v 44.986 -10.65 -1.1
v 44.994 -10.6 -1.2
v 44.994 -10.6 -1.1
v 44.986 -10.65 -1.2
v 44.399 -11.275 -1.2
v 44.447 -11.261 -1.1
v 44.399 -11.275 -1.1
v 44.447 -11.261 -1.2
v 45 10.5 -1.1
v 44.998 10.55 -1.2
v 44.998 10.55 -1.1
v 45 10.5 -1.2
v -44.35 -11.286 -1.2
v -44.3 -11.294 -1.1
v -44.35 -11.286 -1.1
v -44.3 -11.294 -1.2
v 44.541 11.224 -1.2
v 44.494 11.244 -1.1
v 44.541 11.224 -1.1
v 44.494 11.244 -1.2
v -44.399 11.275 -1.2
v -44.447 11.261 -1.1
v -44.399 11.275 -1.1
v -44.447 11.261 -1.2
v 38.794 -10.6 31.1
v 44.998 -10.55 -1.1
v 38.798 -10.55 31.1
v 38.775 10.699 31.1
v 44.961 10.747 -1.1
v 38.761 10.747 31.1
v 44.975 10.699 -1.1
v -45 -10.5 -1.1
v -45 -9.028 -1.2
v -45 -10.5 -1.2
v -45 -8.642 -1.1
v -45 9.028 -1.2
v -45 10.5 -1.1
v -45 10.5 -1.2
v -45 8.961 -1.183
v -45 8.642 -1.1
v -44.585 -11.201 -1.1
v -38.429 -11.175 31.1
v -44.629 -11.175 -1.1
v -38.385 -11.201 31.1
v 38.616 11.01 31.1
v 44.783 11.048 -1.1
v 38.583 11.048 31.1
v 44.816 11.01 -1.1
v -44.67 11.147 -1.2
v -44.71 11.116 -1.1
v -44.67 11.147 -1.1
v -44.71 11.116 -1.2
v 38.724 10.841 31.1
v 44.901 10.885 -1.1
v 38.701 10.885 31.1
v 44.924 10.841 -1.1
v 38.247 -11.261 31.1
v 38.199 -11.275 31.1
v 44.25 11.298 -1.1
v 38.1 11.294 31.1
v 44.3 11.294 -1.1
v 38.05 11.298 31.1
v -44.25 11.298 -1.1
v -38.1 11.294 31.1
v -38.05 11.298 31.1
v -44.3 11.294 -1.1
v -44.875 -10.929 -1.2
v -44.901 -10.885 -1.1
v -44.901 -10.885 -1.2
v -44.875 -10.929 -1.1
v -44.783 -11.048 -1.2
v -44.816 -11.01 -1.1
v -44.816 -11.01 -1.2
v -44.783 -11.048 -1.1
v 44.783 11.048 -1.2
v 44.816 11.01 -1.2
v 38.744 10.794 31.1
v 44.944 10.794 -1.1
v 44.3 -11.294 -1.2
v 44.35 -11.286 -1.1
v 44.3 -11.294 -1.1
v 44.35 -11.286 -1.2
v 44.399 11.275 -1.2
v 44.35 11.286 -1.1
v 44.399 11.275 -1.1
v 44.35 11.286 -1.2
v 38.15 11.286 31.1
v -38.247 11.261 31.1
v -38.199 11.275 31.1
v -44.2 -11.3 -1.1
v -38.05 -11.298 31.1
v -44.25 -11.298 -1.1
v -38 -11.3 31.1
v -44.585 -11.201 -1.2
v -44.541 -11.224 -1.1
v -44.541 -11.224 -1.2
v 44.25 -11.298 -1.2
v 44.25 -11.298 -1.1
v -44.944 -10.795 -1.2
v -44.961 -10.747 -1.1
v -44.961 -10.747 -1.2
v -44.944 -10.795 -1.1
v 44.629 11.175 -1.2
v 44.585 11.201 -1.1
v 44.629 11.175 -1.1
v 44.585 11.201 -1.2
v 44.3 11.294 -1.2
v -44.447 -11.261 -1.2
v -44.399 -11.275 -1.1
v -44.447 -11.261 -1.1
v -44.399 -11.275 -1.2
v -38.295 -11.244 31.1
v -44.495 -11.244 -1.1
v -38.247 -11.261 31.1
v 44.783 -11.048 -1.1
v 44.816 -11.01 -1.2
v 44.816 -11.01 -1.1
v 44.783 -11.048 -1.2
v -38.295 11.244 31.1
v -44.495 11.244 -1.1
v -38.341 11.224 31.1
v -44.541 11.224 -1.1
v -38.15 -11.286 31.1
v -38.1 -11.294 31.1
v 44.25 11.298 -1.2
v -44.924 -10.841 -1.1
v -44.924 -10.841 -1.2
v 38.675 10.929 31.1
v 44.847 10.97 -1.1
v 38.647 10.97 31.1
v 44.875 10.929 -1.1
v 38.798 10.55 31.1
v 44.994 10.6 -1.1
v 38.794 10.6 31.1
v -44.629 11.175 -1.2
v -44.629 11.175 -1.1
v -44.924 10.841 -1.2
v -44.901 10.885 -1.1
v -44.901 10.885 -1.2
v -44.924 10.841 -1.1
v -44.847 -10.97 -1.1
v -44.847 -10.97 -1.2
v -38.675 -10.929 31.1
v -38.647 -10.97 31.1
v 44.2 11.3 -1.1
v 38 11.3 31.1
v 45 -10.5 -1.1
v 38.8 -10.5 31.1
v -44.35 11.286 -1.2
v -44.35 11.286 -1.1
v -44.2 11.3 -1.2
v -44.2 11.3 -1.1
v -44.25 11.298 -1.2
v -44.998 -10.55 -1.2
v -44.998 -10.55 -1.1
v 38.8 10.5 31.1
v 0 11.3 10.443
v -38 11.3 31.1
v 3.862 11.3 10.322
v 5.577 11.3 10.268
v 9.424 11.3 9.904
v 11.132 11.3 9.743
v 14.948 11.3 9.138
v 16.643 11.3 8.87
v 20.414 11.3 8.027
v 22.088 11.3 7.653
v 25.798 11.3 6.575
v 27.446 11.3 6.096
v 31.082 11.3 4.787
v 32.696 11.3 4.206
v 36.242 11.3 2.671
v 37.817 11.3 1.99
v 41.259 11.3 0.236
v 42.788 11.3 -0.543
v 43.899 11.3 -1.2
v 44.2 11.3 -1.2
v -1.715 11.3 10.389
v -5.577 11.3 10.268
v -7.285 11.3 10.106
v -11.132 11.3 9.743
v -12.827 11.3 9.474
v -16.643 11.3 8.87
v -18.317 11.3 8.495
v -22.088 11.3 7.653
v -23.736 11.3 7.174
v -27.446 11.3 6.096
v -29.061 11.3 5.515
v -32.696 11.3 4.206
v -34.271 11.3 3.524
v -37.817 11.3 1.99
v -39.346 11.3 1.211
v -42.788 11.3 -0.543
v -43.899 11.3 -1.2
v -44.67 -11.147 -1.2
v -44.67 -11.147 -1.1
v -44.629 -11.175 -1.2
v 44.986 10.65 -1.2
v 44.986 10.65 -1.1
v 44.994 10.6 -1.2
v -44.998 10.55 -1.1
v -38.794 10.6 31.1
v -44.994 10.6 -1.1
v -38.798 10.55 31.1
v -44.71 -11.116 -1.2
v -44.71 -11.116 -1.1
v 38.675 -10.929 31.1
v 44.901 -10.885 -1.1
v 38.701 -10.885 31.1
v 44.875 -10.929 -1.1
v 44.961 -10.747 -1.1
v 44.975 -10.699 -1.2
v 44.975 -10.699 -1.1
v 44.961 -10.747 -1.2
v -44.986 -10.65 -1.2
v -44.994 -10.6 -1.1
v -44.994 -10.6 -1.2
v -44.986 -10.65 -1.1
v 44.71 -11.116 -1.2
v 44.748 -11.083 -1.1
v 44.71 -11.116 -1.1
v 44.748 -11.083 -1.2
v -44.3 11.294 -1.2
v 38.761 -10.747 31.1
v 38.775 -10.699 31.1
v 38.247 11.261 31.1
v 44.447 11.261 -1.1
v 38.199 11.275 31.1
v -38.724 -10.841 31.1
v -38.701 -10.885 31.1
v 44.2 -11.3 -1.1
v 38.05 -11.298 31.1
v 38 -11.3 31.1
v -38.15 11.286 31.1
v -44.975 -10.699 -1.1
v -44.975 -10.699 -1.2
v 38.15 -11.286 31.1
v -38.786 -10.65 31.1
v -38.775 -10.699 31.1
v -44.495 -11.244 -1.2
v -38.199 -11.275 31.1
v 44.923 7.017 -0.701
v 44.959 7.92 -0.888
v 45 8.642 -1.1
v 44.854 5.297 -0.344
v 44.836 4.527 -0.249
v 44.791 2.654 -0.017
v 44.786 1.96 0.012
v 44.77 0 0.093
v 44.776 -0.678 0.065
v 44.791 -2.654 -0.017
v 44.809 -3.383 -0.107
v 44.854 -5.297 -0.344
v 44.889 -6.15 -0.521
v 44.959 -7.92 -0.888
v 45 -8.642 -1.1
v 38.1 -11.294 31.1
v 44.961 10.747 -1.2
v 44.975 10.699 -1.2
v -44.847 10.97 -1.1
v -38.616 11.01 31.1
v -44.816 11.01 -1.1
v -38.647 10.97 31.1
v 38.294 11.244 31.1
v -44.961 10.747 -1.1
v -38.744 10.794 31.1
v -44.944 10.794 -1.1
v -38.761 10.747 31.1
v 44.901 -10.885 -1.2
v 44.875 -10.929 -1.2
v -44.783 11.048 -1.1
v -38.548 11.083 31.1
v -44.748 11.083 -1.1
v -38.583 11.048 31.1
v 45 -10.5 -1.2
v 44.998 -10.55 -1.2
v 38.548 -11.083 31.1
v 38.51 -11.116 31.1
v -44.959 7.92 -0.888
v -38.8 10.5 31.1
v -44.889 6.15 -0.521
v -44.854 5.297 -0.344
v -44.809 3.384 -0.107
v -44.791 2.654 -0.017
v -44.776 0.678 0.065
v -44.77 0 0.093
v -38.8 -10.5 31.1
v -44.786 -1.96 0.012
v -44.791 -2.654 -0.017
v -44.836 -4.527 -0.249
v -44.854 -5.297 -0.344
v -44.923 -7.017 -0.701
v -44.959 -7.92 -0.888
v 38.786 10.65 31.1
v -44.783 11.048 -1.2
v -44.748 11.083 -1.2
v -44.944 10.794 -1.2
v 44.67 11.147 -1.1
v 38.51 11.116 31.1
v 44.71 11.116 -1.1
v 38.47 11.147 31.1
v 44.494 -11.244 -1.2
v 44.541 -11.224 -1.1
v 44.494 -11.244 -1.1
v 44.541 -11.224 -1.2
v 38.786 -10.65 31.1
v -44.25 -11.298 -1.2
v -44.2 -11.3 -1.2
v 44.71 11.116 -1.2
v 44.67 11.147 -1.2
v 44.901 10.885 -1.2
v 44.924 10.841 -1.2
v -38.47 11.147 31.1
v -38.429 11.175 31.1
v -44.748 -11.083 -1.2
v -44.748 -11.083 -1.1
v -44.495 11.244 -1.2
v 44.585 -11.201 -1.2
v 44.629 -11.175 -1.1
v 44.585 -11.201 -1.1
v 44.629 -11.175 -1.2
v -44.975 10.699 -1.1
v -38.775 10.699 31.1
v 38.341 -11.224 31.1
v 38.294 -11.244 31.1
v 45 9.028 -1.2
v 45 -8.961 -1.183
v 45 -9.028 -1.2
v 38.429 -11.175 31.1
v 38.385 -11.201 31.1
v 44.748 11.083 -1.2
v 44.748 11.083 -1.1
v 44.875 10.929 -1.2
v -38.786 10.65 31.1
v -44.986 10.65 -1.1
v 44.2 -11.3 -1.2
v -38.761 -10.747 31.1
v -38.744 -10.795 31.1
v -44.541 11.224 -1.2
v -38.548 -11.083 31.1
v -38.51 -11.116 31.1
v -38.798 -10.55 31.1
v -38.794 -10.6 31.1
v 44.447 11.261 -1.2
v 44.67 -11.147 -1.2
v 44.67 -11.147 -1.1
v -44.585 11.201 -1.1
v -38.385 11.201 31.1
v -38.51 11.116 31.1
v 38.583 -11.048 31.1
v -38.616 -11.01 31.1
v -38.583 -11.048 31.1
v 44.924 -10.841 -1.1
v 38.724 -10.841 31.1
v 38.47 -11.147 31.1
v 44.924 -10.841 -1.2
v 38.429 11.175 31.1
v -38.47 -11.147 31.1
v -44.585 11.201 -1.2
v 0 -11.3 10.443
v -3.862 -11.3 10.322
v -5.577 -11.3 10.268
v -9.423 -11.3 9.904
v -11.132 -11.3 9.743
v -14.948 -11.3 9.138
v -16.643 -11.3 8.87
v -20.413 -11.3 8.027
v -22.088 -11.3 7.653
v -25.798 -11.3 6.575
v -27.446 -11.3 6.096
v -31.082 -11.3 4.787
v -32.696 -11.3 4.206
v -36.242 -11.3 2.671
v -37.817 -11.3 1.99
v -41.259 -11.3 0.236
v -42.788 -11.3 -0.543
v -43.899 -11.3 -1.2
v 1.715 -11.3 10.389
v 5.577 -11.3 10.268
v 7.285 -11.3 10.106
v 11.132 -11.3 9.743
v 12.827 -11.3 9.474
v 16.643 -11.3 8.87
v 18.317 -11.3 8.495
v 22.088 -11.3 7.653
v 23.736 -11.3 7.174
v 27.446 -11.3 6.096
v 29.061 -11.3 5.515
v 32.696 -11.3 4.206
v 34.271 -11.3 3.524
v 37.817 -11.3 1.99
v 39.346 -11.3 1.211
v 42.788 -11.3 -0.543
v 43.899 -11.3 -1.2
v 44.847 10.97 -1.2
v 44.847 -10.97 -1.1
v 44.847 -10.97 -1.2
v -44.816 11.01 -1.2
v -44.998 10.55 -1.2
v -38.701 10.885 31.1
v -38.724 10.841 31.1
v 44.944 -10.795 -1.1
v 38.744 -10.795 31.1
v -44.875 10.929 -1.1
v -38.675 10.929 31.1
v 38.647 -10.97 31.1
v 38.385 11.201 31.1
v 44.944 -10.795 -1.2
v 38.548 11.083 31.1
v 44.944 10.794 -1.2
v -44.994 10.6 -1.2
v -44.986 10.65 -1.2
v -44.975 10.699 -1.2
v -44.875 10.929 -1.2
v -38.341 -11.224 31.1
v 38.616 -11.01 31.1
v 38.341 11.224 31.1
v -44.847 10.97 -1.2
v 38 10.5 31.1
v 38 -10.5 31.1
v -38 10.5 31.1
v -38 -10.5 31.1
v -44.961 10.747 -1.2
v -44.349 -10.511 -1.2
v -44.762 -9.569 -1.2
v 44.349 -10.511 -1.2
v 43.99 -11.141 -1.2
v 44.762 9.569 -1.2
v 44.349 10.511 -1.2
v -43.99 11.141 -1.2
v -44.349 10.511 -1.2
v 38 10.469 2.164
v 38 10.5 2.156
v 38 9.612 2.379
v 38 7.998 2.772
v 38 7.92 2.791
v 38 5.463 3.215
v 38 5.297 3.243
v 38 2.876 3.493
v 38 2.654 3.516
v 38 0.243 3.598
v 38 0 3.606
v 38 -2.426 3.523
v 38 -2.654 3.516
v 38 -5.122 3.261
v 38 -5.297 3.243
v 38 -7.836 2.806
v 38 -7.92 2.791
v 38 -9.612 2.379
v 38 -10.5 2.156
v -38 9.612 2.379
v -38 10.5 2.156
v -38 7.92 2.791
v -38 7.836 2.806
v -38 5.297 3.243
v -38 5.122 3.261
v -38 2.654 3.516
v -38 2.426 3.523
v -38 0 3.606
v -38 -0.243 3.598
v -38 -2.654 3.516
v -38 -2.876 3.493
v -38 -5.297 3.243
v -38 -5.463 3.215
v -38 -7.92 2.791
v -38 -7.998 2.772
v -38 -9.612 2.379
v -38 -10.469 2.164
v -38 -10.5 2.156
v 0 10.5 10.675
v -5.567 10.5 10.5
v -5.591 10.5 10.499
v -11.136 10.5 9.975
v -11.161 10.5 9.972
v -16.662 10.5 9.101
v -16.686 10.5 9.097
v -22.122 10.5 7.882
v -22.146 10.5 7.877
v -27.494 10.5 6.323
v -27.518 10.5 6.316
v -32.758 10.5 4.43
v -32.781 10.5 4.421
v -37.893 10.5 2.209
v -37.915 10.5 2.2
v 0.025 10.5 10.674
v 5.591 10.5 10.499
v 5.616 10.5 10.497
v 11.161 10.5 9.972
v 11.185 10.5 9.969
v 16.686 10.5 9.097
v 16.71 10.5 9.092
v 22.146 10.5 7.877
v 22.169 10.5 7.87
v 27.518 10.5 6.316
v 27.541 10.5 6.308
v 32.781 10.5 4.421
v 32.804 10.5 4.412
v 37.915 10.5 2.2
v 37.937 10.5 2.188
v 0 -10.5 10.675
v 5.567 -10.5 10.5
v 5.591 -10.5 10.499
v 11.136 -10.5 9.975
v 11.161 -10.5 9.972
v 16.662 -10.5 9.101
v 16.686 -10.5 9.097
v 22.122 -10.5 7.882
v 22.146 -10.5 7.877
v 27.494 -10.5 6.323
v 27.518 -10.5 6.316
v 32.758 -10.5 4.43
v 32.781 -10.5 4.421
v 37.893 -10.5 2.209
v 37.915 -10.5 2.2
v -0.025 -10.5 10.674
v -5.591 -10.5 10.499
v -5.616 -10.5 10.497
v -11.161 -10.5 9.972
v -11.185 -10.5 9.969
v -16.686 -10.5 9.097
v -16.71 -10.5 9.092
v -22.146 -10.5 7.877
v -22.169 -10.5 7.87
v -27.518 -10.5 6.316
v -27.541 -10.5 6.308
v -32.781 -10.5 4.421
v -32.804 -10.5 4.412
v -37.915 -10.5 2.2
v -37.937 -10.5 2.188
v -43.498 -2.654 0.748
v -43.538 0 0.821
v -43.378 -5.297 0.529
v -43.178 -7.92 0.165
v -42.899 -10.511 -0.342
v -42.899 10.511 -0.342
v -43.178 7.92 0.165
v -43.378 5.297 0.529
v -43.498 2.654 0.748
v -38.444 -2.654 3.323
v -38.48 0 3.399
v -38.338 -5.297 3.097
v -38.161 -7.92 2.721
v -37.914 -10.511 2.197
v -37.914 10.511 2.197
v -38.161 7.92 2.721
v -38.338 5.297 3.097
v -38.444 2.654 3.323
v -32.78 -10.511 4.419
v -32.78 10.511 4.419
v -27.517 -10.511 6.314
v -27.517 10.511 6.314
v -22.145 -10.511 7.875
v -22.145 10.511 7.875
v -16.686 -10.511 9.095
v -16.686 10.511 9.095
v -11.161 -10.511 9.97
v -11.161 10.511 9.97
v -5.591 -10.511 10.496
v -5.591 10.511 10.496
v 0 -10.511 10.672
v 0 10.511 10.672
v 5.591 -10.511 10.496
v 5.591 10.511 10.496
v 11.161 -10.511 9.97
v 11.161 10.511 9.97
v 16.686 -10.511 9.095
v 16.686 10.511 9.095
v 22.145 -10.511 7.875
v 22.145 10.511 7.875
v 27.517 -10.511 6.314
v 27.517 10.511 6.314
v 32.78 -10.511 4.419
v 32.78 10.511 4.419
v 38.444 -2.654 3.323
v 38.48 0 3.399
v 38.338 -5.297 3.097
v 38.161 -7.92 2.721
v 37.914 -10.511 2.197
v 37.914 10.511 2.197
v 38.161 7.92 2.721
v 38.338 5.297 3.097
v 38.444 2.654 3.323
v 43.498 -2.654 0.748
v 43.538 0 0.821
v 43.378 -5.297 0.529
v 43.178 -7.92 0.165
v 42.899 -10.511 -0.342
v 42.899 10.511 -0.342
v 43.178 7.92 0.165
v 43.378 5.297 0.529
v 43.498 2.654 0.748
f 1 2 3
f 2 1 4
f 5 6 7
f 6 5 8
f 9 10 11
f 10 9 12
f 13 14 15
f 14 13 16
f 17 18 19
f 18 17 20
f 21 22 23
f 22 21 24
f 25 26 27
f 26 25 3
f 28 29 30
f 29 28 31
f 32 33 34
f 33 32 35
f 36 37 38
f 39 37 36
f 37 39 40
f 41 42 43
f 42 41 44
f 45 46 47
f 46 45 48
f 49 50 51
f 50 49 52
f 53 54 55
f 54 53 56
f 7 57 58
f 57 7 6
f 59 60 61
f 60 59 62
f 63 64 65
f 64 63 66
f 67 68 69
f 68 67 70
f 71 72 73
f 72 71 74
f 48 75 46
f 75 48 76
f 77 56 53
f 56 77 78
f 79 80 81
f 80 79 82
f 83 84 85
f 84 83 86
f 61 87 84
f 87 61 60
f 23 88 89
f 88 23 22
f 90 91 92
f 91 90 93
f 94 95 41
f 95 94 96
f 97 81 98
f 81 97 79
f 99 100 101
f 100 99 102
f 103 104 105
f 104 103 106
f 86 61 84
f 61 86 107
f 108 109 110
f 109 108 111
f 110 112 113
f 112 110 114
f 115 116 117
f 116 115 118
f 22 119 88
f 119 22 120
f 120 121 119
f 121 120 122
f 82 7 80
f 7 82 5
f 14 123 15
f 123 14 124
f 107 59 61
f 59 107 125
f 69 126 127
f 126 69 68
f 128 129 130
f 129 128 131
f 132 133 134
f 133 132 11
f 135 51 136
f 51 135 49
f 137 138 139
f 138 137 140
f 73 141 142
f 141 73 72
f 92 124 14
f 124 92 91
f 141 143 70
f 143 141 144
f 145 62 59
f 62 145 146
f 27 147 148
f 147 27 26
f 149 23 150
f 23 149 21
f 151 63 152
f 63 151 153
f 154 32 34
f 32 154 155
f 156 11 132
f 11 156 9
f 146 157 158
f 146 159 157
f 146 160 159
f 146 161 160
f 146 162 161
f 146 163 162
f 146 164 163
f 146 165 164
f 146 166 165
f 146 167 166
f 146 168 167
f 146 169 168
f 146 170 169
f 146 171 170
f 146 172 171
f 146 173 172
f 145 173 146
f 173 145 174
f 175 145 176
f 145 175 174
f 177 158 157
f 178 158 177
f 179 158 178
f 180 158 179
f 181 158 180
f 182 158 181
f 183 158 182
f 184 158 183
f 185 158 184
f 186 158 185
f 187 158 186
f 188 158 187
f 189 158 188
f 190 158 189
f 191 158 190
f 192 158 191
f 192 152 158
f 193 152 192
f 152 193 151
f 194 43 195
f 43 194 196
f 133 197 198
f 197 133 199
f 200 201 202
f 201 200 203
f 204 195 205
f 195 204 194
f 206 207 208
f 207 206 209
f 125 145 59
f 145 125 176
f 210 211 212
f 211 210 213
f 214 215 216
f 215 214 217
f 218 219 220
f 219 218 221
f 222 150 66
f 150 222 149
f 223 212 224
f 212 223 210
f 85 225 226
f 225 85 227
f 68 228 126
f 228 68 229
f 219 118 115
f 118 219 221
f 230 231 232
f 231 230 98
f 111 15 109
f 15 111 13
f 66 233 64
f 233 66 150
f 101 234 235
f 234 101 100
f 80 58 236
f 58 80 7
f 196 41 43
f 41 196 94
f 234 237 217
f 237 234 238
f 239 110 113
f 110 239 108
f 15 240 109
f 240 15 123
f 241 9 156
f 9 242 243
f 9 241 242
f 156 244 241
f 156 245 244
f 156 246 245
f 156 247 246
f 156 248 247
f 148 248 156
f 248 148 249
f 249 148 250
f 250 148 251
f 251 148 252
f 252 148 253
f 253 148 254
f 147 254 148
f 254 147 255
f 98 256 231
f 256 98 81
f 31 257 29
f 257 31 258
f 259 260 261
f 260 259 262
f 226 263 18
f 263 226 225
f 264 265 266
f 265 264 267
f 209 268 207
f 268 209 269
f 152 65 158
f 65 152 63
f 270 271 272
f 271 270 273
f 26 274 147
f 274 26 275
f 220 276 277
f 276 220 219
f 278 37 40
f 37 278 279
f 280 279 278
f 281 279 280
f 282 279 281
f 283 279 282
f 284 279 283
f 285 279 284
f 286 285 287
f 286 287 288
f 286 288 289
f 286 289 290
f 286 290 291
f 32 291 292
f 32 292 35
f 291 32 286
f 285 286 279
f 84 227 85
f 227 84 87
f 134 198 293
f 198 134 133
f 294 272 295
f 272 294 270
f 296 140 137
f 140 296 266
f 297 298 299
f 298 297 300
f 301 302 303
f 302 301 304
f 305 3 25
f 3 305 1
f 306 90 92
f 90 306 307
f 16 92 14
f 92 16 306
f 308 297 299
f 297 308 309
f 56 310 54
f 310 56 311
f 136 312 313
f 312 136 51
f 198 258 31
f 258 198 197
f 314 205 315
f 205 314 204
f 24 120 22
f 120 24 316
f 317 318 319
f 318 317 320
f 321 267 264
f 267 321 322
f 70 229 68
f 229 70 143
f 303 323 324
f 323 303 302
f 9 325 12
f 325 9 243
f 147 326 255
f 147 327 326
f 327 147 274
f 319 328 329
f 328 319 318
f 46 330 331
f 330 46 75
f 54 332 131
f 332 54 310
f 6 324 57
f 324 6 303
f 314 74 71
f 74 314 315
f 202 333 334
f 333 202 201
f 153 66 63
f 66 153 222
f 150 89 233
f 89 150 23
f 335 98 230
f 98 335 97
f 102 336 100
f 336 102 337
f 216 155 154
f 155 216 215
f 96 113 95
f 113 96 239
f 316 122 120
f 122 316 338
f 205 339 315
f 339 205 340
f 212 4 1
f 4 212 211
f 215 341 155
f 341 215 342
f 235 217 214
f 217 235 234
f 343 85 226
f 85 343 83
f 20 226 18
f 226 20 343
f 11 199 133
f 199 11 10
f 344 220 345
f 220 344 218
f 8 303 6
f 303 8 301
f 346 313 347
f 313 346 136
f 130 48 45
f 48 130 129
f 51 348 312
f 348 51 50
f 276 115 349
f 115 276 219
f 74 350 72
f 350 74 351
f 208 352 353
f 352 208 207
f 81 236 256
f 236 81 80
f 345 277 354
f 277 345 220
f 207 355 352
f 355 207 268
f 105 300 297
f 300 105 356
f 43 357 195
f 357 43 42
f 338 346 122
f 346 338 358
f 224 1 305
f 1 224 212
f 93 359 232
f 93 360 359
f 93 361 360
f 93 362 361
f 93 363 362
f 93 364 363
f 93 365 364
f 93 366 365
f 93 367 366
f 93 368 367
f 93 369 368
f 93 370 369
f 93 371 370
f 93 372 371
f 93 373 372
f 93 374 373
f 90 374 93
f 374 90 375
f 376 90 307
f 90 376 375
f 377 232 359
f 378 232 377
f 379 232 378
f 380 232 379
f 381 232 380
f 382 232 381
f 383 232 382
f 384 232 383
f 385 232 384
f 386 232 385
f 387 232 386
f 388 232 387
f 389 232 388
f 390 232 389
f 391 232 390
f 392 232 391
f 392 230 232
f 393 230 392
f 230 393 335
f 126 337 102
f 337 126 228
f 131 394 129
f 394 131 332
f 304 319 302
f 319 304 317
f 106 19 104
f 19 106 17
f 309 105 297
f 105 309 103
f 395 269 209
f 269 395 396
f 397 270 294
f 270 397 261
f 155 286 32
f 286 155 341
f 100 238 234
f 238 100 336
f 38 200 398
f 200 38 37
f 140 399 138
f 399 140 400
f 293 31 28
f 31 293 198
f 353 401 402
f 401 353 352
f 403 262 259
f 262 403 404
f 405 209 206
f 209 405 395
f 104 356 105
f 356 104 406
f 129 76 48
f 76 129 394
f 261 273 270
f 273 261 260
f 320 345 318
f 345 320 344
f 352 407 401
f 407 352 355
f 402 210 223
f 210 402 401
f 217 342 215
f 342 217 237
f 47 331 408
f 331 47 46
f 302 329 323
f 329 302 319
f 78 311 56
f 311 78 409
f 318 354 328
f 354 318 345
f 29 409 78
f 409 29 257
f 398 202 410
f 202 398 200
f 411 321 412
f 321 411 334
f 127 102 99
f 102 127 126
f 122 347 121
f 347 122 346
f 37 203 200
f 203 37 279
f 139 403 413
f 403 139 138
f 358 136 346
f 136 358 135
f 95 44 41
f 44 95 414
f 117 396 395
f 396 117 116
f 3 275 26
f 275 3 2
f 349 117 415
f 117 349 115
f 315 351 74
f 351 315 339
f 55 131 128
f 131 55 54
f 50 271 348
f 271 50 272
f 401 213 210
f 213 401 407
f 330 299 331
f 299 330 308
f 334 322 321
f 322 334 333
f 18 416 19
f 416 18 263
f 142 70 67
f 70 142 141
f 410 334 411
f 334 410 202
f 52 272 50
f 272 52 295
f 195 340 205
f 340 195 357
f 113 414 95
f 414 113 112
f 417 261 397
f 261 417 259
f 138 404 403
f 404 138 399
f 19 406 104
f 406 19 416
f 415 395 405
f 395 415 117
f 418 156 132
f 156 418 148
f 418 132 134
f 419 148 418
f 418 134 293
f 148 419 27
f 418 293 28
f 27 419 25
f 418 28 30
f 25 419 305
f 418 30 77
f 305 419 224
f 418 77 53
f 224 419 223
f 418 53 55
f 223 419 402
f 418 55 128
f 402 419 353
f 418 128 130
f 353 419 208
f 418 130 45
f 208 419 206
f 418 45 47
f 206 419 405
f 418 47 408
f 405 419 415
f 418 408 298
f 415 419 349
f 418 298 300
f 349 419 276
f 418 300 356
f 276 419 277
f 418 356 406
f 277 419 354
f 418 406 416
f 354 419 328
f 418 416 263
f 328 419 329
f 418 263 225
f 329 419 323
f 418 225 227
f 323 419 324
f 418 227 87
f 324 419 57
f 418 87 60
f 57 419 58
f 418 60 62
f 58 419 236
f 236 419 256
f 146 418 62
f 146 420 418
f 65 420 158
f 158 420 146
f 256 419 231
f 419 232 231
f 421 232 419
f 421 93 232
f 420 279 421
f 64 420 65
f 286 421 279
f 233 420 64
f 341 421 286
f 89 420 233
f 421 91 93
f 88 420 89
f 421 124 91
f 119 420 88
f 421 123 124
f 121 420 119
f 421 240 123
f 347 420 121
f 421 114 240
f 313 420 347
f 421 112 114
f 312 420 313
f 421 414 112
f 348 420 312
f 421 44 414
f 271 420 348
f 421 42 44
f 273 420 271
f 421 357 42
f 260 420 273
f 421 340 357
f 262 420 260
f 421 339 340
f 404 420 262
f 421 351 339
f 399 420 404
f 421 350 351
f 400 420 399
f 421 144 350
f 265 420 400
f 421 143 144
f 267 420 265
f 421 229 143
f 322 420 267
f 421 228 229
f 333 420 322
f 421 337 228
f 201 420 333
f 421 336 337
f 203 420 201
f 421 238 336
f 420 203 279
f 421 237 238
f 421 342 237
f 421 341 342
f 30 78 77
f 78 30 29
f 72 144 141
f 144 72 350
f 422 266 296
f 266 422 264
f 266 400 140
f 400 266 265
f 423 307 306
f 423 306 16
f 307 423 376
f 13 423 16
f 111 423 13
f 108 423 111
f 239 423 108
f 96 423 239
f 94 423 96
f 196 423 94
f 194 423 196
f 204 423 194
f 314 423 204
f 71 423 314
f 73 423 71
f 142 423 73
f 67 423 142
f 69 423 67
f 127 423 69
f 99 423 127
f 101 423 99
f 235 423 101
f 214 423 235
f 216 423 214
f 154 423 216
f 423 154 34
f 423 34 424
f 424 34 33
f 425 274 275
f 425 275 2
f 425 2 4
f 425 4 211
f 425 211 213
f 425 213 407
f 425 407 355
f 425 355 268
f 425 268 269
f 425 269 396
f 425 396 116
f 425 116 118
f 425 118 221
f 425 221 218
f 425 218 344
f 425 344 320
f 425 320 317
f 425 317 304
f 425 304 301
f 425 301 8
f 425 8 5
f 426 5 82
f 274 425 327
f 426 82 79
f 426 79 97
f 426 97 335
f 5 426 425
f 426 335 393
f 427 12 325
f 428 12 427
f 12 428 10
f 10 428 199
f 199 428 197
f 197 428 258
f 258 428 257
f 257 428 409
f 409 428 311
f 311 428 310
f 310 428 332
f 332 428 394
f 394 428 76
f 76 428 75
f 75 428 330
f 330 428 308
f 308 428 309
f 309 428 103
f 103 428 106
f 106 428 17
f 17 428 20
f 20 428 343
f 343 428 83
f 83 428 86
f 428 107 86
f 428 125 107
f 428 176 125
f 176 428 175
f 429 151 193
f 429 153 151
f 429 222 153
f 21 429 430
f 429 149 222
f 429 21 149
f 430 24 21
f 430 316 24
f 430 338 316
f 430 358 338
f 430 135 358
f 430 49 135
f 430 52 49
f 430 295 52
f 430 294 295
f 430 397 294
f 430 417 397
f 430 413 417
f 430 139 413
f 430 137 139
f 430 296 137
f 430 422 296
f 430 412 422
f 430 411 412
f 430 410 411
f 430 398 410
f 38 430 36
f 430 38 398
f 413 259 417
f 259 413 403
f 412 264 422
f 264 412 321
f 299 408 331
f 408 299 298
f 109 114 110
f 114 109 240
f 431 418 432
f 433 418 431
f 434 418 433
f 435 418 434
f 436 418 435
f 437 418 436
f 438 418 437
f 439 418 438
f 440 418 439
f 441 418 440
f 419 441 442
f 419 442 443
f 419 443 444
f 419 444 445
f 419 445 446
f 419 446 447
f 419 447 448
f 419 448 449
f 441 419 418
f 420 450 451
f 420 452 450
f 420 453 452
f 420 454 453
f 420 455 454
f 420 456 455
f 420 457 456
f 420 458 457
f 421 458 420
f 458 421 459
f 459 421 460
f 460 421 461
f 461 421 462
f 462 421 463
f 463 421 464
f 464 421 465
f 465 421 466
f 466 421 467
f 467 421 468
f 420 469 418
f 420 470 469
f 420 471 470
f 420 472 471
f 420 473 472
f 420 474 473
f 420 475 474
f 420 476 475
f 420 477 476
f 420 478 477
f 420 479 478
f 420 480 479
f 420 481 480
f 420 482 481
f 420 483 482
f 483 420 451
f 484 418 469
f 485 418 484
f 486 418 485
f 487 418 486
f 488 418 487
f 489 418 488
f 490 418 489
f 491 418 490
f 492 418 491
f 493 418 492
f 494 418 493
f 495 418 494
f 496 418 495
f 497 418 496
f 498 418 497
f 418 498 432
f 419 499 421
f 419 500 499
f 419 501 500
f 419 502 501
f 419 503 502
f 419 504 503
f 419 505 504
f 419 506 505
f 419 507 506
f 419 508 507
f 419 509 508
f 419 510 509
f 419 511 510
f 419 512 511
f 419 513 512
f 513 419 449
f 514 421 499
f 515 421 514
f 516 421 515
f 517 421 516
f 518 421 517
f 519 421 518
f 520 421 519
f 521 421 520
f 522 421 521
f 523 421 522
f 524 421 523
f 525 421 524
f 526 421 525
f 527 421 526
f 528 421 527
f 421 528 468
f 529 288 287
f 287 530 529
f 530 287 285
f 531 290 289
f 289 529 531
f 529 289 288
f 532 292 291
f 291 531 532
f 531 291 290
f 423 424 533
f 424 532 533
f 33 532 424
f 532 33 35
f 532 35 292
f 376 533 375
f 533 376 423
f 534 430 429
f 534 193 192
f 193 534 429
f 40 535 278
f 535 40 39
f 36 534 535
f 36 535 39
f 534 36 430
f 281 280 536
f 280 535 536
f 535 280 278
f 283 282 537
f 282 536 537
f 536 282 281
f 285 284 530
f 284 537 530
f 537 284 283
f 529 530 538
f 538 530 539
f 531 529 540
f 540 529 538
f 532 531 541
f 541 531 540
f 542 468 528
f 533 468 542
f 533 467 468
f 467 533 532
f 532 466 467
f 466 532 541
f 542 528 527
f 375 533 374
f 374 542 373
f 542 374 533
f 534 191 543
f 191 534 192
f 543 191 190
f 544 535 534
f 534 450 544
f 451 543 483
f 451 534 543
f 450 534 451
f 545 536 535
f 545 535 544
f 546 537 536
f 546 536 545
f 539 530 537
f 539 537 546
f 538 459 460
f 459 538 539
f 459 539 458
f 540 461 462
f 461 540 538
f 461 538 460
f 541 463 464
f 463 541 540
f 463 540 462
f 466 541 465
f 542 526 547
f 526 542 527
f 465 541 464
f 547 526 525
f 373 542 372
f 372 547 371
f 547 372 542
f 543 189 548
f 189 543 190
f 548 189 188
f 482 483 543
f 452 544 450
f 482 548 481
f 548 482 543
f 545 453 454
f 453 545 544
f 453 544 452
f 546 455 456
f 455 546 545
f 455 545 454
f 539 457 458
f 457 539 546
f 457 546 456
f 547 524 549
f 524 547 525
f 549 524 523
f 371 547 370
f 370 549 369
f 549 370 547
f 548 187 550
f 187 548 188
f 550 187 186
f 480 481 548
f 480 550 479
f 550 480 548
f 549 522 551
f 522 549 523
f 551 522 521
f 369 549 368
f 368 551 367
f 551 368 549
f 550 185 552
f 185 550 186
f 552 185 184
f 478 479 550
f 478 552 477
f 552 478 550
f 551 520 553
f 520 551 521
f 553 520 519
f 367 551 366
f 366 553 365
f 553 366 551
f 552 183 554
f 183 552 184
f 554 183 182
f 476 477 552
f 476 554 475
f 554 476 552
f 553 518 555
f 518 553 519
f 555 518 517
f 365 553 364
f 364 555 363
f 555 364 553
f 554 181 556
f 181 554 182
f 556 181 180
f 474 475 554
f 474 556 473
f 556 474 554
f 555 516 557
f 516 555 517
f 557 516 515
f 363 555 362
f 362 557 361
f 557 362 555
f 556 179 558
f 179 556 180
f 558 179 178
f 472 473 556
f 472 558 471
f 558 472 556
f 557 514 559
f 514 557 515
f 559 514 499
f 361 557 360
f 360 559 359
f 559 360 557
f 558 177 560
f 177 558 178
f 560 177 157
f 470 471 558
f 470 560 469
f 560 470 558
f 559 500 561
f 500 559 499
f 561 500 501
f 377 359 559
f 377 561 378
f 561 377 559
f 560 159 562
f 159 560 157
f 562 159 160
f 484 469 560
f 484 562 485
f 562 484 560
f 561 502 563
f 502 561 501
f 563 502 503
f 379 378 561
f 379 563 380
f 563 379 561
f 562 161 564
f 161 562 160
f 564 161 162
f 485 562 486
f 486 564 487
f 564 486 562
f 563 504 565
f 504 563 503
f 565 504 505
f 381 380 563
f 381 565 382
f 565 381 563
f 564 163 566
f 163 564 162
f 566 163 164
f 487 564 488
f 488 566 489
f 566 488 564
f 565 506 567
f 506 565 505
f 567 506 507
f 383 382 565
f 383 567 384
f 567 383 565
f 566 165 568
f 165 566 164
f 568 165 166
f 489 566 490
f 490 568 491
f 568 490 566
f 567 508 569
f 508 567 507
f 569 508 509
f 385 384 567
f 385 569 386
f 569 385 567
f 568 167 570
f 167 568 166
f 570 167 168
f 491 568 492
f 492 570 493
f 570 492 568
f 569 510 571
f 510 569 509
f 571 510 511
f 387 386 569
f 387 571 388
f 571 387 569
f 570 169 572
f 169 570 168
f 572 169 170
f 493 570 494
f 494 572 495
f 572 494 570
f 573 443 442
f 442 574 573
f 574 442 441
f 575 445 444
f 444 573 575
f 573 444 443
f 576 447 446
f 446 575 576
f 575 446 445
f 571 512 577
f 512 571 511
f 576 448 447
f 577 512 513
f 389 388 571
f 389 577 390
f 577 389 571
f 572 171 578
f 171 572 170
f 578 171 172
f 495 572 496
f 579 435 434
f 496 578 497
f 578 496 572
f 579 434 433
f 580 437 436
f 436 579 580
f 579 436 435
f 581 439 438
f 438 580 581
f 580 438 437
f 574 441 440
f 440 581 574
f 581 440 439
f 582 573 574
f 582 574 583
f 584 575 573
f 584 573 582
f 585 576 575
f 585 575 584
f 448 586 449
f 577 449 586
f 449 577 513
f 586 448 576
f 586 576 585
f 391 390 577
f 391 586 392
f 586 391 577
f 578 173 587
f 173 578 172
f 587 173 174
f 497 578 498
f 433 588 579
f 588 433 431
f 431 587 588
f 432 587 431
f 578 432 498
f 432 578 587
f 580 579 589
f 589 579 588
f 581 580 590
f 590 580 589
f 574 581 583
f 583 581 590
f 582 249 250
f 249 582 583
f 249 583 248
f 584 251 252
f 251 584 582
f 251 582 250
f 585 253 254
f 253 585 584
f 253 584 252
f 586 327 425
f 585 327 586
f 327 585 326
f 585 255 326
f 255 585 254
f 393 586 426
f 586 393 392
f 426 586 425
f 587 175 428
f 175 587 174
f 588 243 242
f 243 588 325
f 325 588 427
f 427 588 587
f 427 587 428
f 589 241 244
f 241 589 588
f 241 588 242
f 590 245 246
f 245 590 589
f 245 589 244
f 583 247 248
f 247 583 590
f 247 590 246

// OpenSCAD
$fn=100;

batW=21;
batL=76;
batH=19;
wall=0.8;

aH=12;
aW=90;

// https://www.mathopenref.com/arcradius.html
aR = aH/2 + (aW*aW/(8*aH));

dH=1.2;
dW=20;
dR = dH/2 + (dW*dW/(8*dH));

difference() {
    union() {
        shL = batL + 2*wall;
        shW = batW + 2*wall;
        hull() 
        {
            translate([-shL/2, -shW/2, aH+batH]) 
                linear_extrude(height=0.1) 
                    offset(r=wall) 
                        translate([wall, wall, 0])
                            square([shL-2*wall, shW-2*wall]);
            translate([-aW/2, -shW/2, -dH]) 
                linear_extrude(height=0.1)
                    offset(r=wall)
                        translate([wall, wall, 0])
                            square([aW-2*wall, shW-2*wall]);
        }
    }

    translate([-batL/2, -batW/2, 1]) cube([batL, batW, aH+batH]);

//    #translate([0, 0, -aR + aH]) rotate([90,0,0]) cylinder(h=2*batW, r=aR, center=true);

    translate([0, 0, -aR + aH]) rotate([90,0,0]) rotate_extrude() translate([aR-dR, 0, 0]) circle(r=dR);
}
